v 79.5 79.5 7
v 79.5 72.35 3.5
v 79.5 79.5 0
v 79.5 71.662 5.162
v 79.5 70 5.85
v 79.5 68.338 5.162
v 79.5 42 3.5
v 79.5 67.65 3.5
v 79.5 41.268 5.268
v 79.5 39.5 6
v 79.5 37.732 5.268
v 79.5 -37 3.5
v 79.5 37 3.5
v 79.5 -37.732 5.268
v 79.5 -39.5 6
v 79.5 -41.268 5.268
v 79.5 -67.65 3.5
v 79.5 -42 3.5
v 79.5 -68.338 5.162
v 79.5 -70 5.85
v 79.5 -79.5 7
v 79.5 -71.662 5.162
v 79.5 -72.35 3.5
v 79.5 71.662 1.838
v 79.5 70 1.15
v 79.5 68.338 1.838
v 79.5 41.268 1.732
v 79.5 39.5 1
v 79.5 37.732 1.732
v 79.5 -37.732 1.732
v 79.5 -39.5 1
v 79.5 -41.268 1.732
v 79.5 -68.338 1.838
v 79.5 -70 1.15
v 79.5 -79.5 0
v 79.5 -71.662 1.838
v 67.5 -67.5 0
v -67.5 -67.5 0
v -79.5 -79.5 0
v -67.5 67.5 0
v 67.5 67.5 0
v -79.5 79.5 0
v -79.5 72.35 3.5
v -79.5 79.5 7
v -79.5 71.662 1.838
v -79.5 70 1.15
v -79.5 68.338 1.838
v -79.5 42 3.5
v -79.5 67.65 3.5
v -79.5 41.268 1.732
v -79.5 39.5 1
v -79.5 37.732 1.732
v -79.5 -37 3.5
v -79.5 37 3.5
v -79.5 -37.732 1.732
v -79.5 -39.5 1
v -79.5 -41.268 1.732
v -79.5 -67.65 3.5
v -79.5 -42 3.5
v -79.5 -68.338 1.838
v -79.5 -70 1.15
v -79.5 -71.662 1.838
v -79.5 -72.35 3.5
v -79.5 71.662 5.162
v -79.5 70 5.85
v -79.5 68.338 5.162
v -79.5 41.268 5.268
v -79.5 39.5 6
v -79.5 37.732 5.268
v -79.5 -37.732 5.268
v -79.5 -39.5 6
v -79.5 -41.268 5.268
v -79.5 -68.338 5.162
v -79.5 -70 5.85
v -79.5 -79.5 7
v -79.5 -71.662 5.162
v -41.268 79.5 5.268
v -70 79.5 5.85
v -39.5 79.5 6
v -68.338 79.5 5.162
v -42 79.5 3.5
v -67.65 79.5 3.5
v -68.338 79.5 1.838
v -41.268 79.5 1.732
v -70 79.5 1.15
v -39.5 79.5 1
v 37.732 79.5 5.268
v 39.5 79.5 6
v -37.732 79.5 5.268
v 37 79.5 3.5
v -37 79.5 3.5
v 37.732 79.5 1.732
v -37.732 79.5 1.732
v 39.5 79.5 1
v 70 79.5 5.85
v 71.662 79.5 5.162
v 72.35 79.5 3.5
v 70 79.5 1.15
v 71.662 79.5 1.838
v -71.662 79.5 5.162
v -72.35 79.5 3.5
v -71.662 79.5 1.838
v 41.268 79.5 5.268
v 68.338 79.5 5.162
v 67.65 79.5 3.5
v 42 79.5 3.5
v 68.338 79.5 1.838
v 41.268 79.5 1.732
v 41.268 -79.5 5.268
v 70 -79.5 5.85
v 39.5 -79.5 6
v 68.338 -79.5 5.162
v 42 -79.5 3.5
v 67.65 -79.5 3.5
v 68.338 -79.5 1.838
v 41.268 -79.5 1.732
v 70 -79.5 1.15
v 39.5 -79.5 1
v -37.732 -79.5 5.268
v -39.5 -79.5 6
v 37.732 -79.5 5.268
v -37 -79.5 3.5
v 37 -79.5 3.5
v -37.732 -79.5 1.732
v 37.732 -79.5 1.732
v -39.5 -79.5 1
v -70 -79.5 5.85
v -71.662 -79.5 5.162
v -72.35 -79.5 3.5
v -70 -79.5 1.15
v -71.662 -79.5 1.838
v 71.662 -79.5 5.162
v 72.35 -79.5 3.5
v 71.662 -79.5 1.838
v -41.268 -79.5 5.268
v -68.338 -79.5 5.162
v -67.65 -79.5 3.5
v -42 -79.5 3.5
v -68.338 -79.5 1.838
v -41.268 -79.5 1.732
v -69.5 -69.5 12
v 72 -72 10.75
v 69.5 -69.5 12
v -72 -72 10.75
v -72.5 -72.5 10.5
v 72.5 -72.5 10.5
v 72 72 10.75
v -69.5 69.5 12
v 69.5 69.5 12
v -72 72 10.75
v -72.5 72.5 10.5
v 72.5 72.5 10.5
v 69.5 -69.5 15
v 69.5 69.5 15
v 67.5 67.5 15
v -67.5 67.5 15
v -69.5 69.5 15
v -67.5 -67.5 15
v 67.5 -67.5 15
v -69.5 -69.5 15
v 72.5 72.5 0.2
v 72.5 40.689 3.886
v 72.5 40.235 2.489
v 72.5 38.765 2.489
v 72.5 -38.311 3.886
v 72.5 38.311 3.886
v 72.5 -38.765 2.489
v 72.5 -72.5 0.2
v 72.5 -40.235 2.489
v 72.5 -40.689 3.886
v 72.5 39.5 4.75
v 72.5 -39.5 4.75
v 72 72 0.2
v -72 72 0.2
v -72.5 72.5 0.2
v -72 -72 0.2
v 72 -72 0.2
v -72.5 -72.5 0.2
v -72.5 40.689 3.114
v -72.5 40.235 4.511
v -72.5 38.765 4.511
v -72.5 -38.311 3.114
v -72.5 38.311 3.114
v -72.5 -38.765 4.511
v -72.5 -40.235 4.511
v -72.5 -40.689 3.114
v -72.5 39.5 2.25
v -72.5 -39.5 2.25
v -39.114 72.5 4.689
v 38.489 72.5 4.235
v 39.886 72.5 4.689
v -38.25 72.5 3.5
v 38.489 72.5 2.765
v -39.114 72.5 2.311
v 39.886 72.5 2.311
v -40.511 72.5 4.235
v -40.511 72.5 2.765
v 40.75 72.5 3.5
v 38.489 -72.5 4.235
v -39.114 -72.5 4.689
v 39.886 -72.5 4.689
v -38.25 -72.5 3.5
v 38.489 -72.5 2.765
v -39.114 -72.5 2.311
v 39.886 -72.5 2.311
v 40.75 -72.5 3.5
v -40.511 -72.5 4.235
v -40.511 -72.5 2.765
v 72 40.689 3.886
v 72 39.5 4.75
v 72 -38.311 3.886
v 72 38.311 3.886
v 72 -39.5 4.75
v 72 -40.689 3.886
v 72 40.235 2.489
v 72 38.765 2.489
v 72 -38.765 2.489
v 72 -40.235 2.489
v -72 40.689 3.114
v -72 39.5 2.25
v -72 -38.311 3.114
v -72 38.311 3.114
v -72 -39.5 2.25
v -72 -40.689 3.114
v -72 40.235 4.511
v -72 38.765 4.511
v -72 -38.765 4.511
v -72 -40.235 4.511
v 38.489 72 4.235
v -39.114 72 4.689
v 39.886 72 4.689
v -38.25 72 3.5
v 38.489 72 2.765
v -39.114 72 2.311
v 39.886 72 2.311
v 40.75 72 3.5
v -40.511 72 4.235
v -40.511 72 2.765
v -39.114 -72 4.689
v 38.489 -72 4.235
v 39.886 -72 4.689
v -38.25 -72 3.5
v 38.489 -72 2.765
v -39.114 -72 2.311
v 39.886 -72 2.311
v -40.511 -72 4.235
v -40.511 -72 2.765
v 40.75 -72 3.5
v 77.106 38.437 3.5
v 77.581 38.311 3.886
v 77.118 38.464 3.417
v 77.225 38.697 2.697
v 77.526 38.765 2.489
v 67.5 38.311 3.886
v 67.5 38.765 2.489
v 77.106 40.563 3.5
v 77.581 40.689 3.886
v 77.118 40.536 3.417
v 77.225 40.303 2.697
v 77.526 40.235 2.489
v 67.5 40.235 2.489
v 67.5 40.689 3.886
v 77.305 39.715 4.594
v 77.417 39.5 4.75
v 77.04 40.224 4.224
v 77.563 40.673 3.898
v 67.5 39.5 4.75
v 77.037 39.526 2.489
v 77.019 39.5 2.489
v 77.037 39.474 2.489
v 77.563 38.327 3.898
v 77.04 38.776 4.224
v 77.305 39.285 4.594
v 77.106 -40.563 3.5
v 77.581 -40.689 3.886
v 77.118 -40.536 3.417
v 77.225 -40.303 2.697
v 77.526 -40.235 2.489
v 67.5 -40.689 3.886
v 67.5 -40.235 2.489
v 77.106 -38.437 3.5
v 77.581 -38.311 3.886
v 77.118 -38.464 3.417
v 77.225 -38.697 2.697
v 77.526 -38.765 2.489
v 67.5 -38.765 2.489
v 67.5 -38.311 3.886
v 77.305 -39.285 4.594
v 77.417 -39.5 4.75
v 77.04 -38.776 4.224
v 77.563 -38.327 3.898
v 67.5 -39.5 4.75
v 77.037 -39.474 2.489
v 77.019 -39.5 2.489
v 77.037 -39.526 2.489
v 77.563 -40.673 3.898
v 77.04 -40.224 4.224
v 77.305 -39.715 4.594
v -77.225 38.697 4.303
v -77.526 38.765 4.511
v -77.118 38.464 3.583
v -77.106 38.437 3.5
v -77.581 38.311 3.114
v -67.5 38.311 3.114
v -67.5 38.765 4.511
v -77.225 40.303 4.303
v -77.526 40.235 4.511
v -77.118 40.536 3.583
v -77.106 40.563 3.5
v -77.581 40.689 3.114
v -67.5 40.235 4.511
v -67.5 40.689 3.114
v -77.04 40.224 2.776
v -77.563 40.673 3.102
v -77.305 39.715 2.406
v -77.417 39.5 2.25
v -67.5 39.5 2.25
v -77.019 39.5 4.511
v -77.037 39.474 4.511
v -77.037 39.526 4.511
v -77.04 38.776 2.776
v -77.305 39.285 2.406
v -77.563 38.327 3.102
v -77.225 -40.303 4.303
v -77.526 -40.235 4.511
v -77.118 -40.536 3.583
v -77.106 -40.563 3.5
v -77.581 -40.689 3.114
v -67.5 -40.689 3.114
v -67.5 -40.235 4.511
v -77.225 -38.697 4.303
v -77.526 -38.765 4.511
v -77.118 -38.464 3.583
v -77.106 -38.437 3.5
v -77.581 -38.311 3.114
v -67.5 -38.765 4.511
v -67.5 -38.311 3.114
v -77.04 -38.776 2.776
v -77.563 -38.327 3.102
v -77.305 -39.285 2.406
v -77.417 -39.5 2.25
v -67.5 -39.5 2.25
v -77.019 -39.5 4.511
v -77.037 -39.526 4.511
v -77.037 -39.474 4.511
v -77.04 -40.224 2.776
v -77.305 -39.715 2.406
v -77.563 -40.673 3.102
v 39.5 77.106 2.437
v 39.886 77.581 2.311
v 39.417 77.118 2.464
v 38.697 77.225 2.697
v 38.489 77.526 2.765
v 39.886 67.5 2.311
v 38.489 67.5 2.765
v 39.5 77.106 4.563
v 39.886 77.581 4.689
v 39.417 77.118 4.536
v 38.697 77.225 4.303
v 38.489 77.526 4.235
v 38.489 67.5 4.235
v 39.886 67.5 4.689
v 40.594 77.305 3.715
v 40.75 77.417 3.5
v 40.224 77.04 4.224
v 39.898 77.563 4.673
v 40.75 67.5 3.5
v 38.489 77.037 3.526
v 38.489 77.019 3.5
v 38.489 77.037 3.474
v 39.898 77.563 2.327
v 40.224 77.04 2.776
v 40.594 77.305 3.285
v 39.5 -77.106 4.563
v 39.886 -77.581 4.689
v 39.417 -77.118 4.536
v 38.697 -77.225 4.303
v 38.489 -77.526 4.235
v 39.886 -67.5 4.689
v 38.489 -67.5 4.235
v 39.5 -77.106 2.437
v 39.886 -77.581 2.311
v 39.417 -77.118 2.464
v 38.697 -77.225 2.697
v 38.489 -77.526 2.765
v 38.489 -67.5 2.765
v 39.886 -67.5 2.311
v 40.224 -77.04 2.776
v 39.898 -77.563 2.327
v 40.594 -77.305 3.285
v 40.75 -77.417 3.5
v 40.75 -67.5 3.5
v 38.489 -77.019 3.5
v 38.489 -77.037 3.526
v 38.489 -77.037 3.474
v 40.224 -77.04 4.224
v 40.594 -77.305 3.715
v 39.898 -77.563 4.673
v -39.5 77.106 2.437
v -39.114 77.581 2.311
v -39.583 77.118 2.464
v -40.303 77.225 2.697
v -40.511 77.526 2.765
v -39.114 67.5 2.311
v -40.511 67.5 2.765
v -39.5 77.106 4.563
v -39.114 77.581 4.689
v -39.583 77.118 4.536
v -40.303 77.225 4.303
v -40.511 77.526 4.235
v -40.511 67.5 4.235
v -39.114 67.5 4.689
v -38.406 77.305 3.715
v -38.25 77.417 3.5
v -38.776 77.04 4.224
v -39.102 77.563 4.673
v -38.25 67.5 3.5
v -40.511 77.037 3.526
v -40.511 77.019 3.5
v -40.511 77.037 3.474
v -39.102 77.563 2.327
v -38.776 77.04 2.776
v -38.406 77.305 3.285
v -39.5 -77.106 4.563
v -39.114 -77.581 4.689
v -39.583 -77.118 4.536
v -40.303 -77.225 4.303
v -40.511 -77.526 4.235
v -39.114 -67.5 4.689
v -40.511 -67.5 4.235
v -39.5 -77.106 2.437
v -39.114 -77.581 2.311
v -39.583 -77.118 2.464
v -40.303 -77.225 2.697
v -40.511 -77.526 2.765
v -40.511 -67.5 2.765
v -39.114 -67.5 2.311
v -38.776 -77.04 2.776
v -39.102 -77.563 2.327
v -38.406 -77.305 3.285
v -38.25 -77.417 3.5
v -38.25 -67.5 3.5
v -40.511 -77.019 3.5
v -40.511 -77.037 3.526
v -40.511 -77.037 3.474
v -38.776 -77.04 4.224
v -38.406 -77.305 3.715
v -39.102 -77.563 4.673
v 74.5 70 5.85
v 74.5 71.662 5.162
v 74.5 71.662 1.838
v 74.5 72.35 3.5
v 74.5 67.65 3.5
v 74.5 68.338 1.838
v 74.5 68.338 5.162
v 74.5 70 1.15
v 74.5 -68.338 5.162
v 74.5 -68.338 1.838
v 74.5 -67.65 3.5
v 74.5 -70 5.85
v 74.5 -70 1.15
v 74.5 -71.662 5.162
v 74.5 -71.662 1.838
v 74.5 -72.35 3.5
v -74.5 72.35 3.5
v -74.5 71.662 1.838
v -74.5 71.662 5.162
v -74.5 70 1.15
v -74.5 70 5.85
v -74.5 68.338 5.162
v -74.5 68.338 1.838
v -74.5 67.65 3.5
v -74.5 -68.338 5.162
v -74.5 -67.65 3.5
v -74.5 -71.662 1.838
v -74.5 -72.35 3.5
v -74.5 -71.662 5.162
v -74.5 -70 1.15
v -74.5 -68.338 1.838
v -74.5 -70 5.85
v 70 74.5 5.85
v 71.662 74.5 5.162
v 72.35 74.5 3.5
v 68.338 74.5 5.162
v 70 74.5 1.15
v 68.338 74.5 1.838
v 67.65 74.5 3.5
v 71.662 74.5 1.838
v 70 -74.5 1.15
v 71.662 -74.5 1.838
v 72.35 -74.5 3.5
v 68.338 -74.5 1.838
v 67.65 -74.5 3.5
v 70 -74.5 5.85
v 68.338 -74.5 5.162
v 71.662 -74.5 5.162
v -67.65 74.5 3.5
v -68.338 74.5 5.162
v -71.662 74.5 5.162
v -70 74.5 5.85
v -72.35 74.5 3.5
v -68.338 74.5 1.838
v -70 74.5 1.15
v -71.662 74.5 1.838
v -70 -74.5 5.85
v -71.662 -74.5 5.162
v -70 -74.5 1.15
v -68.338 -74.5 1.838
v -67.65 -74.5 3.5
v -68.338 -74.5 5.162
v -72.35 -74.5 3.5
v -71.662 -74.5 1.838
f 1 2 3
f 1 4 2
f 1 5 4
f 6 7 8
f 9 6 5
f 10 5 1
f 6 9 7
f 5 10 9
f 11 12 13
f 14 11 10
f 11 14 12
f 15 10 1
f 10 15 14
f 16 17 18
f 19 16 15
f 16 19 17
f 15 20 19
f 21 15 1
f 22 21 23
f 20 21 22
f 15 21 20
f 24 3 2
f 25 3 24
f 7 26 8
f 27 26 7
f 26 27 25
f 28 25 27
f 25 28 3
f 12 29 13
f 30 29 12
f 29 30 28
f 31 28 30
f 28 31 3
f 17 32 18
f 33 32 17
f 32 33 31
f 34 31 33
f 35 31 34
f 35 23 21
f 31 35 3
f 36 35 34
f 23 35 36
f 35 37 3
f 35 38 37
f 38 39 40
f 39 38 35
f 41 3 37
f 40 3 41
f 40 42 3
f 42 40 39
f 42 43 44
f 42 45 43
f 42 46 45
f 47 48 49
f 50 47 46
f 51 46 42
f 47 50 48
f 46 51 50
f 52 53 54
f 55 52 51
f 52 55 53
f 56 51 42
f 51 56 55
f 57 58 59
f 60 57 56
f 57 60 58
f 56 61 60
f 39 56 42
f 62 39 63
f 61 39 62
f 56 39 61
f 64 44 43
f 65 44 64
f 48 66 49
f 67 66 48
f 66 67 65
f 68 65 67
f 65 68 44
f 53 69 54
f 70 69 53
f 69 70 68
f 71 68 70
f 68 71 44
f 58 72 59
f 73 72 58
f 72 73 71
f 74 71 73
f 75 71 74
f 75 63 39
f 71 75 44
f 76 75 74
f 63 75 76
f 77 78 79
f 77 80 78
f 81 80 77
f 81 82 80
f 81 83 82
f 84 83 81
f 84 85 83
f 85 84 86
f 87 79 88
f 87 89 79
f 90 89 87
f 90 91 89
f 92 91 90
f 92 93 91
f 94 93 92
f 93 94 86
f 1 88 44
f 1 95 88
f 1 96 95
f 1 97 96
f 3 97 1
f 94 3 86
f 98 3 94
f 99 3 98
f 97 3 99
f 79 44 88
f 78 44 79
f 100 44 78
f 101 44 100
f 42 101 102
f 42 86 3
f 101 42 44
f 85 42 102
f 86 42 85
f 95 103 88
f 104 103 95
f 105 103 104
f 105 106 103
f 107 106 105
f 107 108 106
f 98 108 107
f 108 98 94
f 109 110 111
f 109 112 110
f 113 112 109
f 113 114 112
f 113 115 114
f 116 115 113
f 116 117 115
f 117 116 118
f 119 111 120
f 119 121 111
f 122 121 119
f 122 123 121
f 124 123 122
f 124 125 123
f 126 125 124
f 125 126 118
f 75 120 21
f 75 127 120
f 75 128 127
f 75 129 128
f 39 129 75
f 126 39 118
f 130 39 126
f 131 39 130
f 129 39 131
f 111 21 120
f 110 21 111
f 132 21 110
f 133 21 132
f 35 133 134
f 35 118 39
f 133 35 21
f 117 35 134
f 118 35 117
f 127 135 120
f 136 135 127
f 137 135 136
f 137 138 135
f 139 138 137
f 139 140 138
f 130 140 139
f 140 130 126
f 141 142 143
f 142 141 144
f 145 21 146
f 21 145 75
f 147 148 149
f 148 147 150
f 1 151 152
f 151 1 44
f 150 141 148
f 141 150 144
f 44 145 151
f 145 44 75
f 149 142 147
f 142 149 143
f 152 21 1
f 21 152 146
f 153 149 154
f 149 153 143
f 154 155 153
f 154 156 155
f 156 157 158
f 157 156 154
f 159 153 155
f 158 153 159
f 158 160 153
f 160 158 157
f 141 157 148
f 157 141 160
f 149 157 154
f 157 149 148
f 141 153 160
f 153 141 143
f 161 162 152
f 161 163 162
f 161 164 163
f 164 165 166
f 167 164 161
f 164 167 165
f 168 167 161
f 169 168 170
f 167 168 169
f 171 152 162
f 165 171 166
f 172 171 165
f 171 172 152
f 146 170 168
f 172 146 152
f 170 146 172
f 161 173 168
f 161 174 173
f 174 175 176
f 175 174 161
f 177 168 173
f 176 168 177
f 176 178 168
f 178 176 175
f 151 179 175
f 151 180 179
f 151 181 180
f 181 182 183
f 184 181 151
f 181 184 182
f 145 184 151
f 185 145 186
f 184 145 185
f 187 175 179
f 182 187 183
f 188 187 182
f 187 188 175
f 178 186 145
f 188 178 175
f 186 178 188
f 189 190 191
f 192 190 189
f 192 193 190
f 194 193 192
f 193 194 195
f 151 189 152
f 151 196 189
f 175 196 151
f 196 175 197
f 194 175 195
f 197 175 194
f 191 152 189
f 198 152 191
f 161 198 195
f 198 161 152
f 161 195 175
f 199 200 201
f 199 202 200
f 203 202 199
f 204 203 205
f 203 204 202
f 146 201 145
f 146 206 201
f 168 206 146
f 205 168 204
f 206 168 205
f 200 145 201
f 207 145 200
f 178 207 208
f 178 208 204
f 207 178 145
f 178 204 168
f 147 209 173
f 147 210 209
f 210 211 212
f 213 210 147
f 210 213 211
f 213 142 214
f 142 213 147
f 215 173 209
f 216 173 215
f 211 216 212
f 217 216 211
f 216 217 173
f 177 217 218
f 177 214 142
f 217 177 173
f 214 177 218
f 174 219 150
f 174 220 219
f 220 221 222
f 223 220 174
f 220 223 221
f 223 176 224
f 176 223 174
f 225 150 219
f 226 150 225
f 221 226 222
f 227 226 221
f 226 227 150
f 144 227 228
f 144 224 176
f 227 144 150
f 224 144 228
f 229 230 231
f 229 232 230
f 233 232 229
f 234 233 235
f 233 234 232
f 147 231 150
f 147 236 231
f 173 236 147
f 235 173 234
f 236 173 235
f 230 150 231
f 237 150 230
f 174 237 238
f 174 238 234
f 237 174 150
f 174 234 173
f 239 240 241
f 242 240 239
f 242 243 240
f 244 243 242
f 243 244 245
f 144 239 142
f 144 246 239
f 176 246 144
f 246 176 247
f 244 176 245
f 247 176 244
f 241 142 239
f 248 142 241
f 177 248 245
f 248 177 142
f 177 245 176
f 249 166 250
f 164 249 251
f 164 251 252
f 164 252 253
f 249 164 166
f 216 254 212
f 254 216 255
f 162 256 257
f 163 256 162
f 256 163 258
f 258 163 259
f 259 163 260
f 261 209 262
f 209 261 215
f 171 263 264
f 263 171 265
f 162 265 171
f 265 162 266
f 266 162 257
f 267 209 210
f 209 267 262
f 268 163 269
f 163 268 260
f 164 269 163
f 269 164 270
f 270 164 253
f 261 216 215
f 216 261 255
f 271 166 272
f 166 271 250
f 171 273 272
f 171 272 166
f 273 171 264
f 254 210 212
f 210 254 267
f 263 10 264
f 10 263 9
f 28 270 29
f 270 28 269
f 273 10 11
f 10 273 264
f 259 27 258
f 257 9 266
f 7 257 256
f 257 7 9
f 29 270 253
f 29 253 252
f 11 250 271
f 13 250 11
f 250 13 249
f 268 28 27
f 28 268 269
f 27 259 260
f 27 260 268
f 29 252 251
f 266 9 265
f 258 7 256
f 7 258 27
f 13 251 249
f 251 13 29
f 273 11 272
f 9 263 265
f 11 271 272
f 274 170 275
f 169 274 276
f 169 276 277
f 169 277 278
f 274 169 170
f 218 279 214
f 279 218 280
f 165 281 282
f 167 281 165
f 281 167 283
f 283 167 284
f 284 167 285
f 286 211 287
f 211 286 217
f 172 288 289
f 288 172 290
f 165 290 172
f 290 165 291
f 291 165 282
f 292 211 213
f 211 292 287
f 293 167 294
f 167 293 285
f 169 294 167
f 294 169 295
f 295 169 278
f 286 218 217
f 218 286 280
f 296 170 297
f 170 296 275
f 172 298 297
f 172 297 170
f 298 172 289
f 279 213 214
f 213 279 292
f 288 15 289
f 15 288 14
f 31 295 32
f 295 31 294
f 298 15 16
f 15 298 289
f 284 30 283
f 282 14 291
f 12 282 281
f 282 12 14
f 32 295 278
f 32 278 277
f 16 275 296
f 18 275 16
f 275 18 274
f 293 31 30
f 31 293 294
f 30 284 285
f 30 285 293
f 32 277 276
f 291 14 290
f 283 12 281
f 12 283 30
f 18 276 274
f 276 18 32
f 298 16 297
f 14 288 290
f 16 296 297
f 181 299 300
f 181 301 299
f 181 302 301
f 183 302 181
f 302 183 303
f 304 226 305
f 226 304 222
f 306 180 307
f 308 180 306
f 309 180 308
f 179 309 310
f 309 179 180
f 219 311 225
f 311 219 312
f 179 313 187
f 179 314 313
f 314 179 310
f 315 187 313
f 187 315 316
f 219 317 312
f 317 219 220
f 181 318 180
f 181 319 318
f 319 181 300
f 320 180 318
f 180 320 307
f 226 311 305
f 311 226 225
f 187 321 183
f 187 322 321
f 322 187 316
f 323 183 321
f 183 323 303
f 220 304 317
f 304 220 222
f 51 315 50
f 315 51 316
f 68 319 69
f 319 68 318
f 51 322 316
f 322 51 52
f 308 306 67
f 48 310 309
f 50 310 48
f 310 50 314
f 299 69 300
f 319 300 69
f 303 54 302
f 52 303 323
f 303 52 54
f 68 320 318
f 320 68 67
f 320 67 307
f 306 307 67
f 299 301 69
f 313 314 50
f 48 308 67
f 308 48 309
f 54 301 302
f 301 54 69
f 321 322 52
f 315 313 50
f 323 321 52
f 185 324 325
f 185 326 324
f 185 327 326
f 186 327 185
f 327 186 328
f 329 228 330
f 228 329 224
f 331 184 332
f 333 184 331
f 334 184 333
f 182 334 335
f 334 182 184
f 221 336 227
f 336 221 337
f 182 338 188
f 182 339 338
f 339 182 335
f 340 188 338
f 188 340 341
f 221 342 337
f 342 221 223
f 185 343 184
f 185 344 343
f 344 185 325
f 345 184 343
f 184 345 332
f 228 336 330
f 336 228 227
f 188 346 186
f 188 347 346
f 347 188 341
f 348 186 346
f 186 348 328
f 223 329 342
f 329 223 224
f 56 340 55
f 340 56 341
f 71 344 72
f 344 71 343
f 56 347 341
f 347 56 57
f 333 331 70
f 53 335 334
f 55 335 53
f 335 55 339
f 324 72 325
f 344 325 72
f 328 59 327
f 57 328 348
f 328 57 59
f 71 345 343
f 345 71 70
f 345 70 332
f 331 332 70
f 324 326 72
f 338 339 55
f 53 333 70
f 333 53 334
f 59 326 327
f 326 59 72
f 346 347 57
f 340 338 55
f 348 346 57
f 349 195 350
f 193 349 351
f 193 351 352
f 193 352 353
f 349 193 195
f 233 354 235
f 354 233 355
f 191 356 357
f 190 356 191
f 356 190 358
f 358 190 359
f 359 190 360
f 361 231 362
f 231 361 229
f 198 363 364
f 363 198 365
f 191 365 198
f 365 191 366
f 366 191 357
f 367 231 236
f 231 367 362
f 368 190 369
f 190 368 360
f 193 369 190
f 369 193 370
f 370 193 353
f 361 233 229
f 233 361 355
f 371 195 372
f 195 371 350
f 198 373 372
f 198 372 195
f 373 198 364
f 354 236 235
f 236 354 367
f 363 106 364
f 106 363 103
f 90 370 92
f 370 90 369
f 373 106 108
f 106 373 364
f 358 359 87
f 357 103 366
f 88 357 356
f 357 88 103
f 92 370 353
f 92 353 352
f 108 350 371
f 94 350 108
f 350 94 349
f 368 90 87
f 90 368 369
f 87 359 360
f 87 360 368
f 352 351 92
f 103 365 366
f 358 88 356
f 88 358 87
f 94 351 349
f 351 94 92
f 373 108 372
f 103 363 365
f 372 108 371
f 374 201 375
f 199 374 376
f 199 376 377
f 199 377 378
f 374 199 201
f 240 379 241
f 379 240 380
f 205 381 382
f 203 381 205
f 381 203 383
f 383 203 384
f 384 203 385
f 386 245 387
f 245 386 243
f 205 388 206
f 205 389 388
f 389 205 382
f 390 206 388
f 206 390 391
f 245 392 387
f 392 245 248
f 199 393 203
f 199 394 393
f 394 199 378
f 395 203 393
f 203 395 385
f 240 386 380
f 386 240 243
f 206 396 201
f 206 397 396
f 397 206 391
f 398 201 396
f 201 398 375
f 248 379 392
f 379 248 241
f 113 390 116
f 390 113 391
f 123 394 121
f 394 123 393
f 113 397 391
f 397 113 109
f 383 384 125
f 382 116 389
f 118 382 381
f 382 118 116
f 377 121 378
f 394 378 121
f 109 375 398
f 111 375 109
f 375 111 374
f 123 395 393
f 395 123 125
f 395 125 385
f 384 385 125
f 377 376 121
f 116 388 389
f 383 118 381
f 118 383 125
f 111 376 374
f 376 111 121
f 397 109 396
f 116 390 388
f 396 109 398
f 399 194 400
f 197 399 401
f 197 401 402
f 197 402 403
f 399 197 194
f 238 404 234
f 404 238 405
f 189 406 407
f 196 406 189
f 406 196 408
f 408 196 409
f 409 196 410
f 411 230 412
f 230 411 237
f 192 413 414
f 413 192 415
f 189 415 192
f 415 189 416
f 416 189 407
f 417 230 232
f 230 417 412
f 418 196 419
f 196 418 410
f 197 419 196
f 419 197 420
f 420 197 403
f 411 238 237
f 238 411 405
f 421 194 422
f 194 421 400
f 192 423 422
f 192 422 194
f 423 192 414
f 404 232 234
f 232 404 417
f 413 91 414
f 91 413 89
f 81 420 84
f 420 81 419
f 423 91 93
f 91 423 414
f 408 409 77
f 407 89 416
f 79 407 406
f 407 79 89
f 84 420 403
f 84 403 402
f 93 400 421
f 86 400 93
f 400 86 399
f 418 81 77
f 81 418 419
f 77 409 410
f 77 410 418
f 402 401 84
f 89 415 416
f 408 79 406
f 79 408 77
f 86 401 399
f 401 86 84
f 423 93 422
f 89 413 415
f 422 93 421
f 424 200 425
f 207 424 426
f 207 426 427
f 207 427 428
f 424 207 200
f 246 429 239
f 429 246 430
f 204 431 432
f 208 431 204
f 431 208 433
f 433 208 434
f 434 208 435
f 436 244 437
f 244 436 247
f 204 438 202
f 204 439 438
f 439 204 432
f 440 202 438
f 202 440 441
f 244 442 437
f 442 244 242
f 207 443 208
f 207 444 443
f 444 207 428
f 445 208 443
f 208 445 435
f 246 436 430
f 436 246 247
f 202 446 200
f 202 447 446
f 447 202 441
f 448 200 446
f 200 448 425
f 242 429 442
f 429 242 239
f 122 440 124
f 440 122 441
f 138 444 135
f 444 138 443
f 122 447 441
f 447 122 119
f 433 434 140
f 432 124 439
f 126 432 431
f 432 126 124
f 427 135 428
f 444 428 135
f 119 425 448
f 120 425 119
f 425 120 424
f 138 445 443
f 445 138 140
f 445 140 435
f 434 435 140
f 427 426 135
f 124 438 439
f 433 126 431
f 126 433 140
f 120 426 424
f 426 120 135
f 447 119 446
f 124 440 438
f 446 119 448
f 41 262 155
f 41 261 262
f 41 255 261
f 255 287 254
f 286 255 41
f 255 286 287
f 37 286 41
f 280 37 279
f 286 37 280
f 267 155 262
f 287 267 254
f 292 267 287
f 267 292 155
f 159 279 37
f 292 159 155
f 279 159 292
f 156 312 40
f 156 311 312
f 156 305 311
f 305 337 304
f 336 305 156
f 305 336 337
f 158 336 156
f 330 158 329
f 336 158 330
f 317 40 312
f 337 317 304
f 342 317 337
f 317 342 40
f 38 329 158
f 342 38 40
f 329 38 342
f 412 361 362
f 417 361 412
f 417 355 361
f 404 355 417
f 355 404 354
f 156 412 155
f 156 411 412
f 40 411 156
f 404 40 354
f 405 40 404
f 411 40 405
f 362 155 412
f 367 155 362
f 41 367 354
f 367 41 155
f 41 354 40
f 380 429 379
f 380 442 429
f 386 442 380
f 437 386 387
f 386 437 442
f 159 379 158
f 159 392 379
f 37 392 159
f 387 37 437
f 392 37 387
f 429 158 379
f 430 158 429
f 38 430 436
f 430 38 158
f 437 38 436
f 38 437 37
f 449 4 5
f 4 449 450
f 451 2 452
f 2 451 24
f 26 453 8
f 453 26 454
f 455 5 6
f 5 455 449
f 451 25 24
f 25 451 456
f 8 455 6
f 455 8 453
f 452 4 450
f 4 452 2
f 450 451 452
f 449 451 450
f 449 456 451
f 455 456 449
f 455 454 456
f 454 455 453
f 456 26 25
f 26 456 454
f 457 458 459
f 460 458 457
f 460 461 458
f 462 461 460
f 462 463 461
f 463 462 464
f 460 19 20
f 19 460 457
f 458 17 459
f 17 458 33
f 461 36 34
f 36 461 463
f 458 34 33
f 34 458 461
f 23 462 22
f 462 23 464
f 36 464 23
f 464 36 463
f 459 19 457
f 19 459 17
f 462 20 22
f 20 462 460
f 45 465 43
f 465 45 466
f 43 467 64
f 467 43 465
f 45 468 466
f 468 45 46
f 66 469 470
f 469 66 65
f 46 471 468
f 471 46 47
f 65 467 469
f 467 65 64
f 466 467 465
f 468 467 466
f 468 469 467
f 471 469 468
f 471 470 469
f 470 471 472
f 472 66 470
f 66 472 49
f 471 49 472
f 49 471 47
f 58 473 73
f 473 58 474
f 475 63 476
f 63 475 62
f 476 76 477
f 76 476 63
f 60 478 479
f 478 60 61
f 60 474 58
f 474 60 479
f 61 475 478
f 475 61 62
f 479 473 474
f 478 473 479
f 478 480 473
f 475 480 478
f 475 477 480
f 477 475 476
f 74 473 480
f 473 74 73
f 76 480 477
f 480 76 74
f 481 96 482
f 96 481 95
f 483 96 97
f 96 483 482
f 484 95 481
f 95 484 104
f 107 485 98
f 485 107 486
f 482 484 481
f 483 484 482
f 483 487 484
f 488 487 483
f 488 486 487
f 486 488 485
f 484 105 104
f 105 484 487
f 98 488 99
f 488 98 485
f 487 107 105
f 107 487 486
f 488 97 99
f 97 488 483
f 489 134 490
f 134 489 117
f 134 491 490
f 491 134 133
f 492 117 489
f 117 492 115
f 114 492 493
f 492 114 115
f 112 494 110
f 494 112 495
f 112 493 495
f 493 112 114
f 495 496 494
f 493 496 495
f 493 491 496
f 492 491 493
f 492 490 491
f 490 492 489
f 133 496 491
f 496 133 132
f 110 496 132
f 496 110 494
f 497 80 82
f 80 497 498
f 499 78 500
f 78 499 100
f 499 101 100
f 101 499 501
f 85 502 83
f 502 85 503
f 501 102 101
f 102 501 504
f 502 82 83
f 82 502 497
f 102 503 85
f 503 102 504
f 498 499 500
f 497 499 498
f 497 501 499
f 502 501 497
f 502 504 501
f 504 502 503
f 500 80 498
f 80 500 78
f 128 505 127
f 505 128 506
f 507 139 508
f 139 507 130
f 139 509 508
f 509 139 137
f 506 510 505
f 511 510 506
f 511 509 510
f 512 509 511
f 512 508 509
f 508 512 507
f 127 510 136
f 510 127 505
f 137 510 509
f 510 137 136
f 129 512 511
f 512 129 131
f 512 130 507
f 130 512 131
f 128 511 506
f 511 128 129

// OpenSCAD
// file: config_4x5.scad
/*
This is the base configuration file for the 4x5" format
# we are not using the exact ANSI measures, but slightly rounded measures for slight simplification
*/
vStabilizerTotal_h = 7;

// general tolerance
vTolerance = 0.2;

// sheet film and cassette measurements (roughly based on the ANSI measurements)
vFilmSheet_l = 127;
vFilmSheet_w = 102;
vCassette_l = 160; // A min
vCassette_w = 121; // B max
vCassette_h = 13.2; // C max
vLightTrap_l = 2; // M2
vLightTrap_w = vCassette_w;
vLightTrap_h = 1.5; // M1
vLightTrap_offsetX = 141; // G max
vFilmWindow_l = 121;
vFilmWindow_w = 101;
vFilmWindow_offsetX = 16;
vGroundGlass_offsetZ = 5;

// Graflok
vGraflok_h = 6; // this is not the official measurement, just measured from a camera 

// lens board measures (we are using Wista/Technika-style lensboards)
vLensboard_l = 100;
vLensboard_w = 97;
vLensboard_h = 2;
vLensboard_offsetX = -(vLensboard_l+3)/2; // caution: we have an asymetric offset!
vLensboard_offsetY = -vLensboard_w/2;
vLensboardHole_d = 85;
vLensboardLighttrap_d = 89;
vLensboardLighttrap_h = 1+vTolerance;

// bellows frame measures - the bellows frame design is derived from standardcameras.com
// back frame
vBellowsBackInner_l = 144; //???? check and replace with the measurement from your bellows!
vBellowsBackInner_w = vBellowsBackInner_l;
vBellowsBackOuter_l = vBellowsBackInner_l+1;
vBellowsBackOuter_w = vBellowsBackOuter_l;

vBellowsBackFrameOuter_l = 159;
vBellowsBackFrameOuter_w = vBellowsBackFrameOuter_l;
vBellowsBackFrameOuter_h = 7;
vBellowsBackFrameInner_l = 135;
vBellowsBackFrameInner_w = vBellowsBackFrameInner_l;
vBellowsBackFrameInner_h = 5;

vBellowsBackLightTrapOuter_l = vBellowsBackFrameInner_l+2*2;
vBellowsBackLightTrapOuter_w = vBellowsBackLightTrapOuter_l;
vBellowsBackLightTrap_h = 3;

//vBellowsBackFrameScrewHole_d = 2;
//vBellowsBackFrameScrewHole_h = 10;
vBellowsBackFrameScrewHole_offsetXY = 70;
vBellowsBackFrameScrewHole_offsetZ = vBellowsBackFrameOuter_h/2;

// front frame
vBellowsFrontInner_l = 94; //???? check and replace with the measurement from your bellows!
vBellowsFrontInner_w = vBellowsFrontInner_l;
vBellowsFrontOuter_l = vBellowsFrontInner_l+1;
vBellowsFrontOuter_w = vBellowsFrontOuter_l;

vBellowsFrontFrameOuter_l = 104;
vBellowsFrontFrameOuter_w = vBellowsFrontFrameOuter_l;
vBellowsFrontFrameOuter_h = 7;
vBellowsFrontFrameInner_l = 82;
vBellowsFrontFrameInner_w = vBellowsFrontFrameInner_l;
vBellowsFrontFrameInner_h = 5;

vBellowsFrontLightTrapOuter_l = vBellowsFrontFrameInner_l+2*2;
vBellowsFrontLightTrapOuter_w = vBellowsFrontLightTrapOuter_l;
vBellowsFrontLightTrap_h = 0;

//vBellowsFrontFrameScrewHole_d = 2;
//vBellowsFrontFrameScrewHole_h = 10;
vBellowsFrontFrameScrewHole_offsetXY = 40;
vBellowsFrontFrameScrewHole_offsetZ = vBellowsFrontFrameOuter_h/2;

// body dimensions
vWall_strength = 5;
vBodyOuter_l = 185; // make sure this is at least 4*vWall_strength larger than vBellowsBackFrameOuter_l!
vBodyOuter_w = 170; // make sure this is at least 2*vWall_strength larger than vBellowsBackFrameOuter_l!
vBodyOuter_h = 65;
vBodyEdge_r = vWall_strength;

// we will center our model on the Y axis and on the center of the bellows frame
// at least for the 4x5 version, we have to do an asymetric offset of 2.5mm on the X-axis 
vAsymOffsetX = -2.5;  

// back plate
vBackPlateLength = 160; // we will probably use about the same size as the bellows back frame
vBackPlateStrength = vWall_strength;

// hinges for front lid
vHingeInnerDistance = 100;
vHingeBaseWidth = 20;
vHingeHole = 5;

// lid lock measures
vLidLockBase_d = 8;
vLidLockHole_distance = 70;

// rail dimensions
vLowerRail_w = 90;
vUpperRail_w = vLowerRail_w;

// cutout for stop indents
vStopIndent_l = 4;
vStopIndent_h = 5;
vStopIndentDistance = 25; // shorter than 25 is not necessary
vStopIndent_offsetX = 20; // don't go shorter than 20 if you intend to use a 90mm lens!

// for all dovetails we use a base width of 5mm and a base height of 5mm
// we are applying tolerances to the inner AND outer part of a dovetail, in width and height
vDoveTail_w = 5;
vDoveTail_h = 5;
vDoveTail_tolerance = 0.2;

// front standard carrier / slider
// width is depending on vUpperRail_w
vSliderBase_w = vUpperRail_w + (4*vDoveTail_w);
vSliderBase_l = 40; // make sure to have enough space in the body.


// lever plate 
vLeverPlateBase_w = vUpperRail_w - (8*vDoveTail_w);
vLeverPlateBlock_w = 25;
vLeverPlateBlock_l = vSliderBase_l-(2*vDoveTail_w);

vFrontStandard_h = 130;
vFrontStandardSlot_h = vFrontStandard_h - 30;

// lensboard carrier
vFrontPlate_length = vSliderBase_w+6; // vSliderBase_w is a bit too tight for 4x5", so there we will add 5mm, for 5x7 vSliderBase_w is OK to get a squared lensboard carrier
vFrontPlate_width = vSliderBase_w; //vFrontPlate_length;
vFrontPlate_height = 16;
vEdgeCutCylinder = floor(sqrt(2*pow(vFrontPlate_width,2)))-5;

vTiltDovetailBase_d1 = 30;
vTiltDovetailBase_d2 = vTiltDovetailBase_d1+(2*vDoveTail_w);
vTiltDovetailBaseBlock_d = vTiltDovetailBase_d1+(4*vDoveTail_w);

vTiltDovetail_d1 = vTiltDovetailBase_d1-vTolerance;
vTiltDovetail_d2 = vTiltDovetailBase_d2-vTolerance;
vTiltDovetail_h = vDoveTail_w-vTolerance;

vTiltDovetailCutout_d1 = vTiltDovetailBase_d2+vTolerance;
vTiltDovetailCutout_d2 = vTiltDovetailBase_d1+vTolerance;

vAxisHole_d = 10+vTolerance;
vAxisHole_h = vDoveTail_w+vTolerance;

vTiltLockBolt_d = 12;
vTiltLockBolt_h = 14;
vTiltLockBoltHole_d = 8;
vTiltLockBoltHole_h = vTiltLockBolt_h;

vTiltHeight = 50;
vTiltRadius = vFrontPlate_length/2;
vTiltAngleMinus = -7;
vTiltAnglePlus = 7;
vTiltAxis_d = 10-vTolerance;

// focusing rod
vFocusingRod_d = 6;
vFocusingKnob_d = 25;
vFocusingKnob_h = 20;

// stabilizer measures (just the outer measures of our stabilizer block, not the tripod slider)
vStabilizerBase_l = 135;
vStabilizerBase_w = 90;  
vStabilizerBase_h = 7;
vStabilizerDovetailBase_w = 50;
// screw holes for the stabilizer
vLidHoleCount_x = 4;
vLidHoleDist_x = 35;
vLidHoleCount_y = 2;
vLidHoleDist_y = 60;


// screw diameters, length is individually set
vScrew1Hole_d = 3;
vScrew1ThreadHole_d = 2.2;
vScrew2Hole_d = 2;
vScrew2ThreadHole_d = 1.4;


// Dimensions for small heat set insert holes.
// Sized for M2 inserts, 4 mm depth, 3.5 mm max OD
// (may be labelled M2x3.5x4)
vInsertM2Hole_d = 3.2;
vInsertM2MinDepth_h = 5.0;
vInsertM2Size_d = 3.5;
vInsertM2Depth_h = 4.0;

// Dimensions for heat set insert holes.
// Sized for "Voron standard" M3 inserts, 4 mm depth, 5 mm max OD
// (variously labelled M3x4x5 or M3x5x4)
vInsertM3Hole_d = 4.7;
vInsertM3MinDepth_h = 5.0;
vInsertM3Size_d = 5.0;
vInsertM3Depth_h = 4.0;

// Dimensions for large heat set insert holes.
// Sized for M5 inserts, 5 mm depth, 7 mm max OD
// (may be labelled M5x7x5)
vInsertM5Hole_d = 6.7;
vInsertM5MinDepth_h = 6.0;
vInsertM5Size_d = 7.0;
vInsertM5Depth_h = 5.0;
// file: modules.scad
/*
This is a collection of the modules which are used heavily within the whole project.
Almost all parts rely on the modules to remain "as is", especially regarding their current orientation.
So please act very carefully here, otherwise you may screw up the complete design!

*/
include <baseconfig.scad>;


// roof module - this is heavily used for dovetail cutouts
// please keep as is
module roof(l, w, h){
    polyhedron(
        points=[
            [0,0,0],
            [l,0,0],
            [l,w,0],
            [0,w,0],
            [0,w/2,h],
            [l,w/2,h]
            ],
        faces=[
            [0,1,2,3],
            [0,4,1],
            [1,4,5,2],
            [2,5,3],
            [3,5,4,0]
            ]
            );
    };

// a wedge module - this is heavily used for cutting edges
// please keep as is    
module wedge(l, w, h) {
    polyhedron(
            points=[
                [0,0,0],
                [l,0,0],
                [l,w,0],
                [0,w,0],
                [0,0,h],
                [l,0,h]
            ],
            faces=[
                [0,3,2,1],
                [0,1,5,4],
                [1,2,5],
                [2,3,4,5],
                [3,0,4]
            ]
    );
   };

// simple tube module.   
module tube(d1, d2, h) {
    difference() {
        cylinder(d=d1, h=h);
        cylinder(d=d2, h=h);
        };
    };

// mainly used for making holes for countersunk screws
// please keep as is    
module countersunk_screw(vScrew_d, vScrew_l){
    union(){
    cylinder(d=vScrew_d, h=vScrew_l);
    cylinder(d1=vScrew_d*2, h=vScrew_d);
    };
};

// module for making hexagons, e.g. hex nuts. kw is the key width
// please keep as is
module hex(kw, h) {
	render()
        translate([0, 0, h/2])
            intersection_for(a = [0, 120, 240]) {
                rotate([0, 0, a])
                    cube([kw, 3 * kw, h], true);
                }
}


// Heatset insert
// d: Thread diameter
// od: Outer diameter
// l: Total length
module insert(d, od, l)
{
    difference() {
        cylinder(l, d=od, $fn=15);
        translate([0, 0, -0.5]) cylinder(l+1, d=d, $fn=15);
        };
}

module insert_m2()
{
    color("gold") insert(2, vInsertM2Size_d, vInsertM2Depth_h);
}

module insert_m3()
{
    color("gold") insert(3, vInsertM3Size_d, vInsertM3Depth_h);
}

module insert_m5()
{
    color("gold") insert(5, vInsertM5Size_d, vInsertM5Depth_h);
}

// Countersunk screw, metric, for display
// Example: https://www.aliexpress.com/item/1005007838338973.html
module screw_cs(l, d=3, dk=6, s=2, t=1) {
    // l: total length (including head) in mm
    // d: thread diameter (eg 3 for M3)
    // dk: max head diameter
    // s: hex socket flat-to-flat size
    // t: hex socket depth
    difference() {
        union() {
            cylinder(h=l, r=d/2, $fn=15);
            cylinder(h=(dk-d)/2, r1=dk/2, r2=d/2, $fn=15);
            }
        cylinder(h=t, r=s/2*2/sqrt(3), $fn=6);
    }
}

module screw_m3_cs(l) {
    color("silver") screw_cs(l, d=3, dk=6, s=2, t=1);
}

// Button head screw, metric, for display
// Example: https://www.aliexpress.com/item/32967225441.html
module screw_bh(l, d=3, k=1.5, dk=5.5, s=2, t=1) {
    // l: shaft length (NOT including head) in mm
    // d: thread diameter (eg 3 for M3)
    // k: head depth
    // dk: head max diameter
    // s: hex socket flat-to-flat size
    // t: hex socket depth
    difference() {
        union() {
            translate([0, 0, k]) cylinder(h=l, r=d/2, $fn=15);
            difference() {
                translate([0, 0, k]) intersection() {
                    sphere(d=dk, $fn=15);
                    translate([-dk/2, -dk/2, -dk]) cube(dk);
                }
                translate([-dk/2, -dk/2, -dk]) cube(dk);
            }
        }
        cylinder(h=t, r=s/2*2/sqrt(3), $fn=6);
    }
}

module screw_m2_bh(l) {
    color("silver") screw_bh(l, d=2, dk=3.4, s=1.175, t=0.6);
}
// file: baseconfig.scad
/*
Here we define some variables which are independent from the camera format
*/


// some generic variables

// we are including a format specific configuration sheet - but make sure to include only one!

include <config_4x5.scad>;
// include <config_5x7.scad>;
// include <config_8x10.scad>;

// Arca Swiss tripod plate
// caution: some Arca Swiss compatible tripod heads may have slight variations
// vArca_length = xx; // the length is irrelevant here
vArca_width = 38;
vArca_height = 7;
vArcaBase_cutout = 4;
vArcaBase_height = 1.5;
// main file
// loading the base configuration
include <baseconfig.scad>;

// some modules such as hex, countersunk screws, roof, wedge are available in a module file
use <modules.scad>;

module bellows_back_frame() {

// we are centering our cube
vLowerCube_l = vBellowsBackFrameOuter_l;
vLowerCube_w = vLowerCube_l;
vLowerCube_h = vBellowsBackFrameOuter_h;
vLowerCube_offsetX = -vLowerCube_l/2;
vLowerCube_offsetY = -vLowerCube_w/2;
vLowerCube_offsetZ = 0;

// we build our pyramid as cone with 4 segments
vMiddlePyramid_d1 = sqrt(2*pow(vBellowsBackFrameOuter_l,2));
vMiddlePyramid_d2 = sqrt(2*pow(vBellowsBackLightTrapOuter_l,2));
vMiddlePyramid_h = vBellowsBackFrameInner_h;
vMiddlePyramid_offsetX = 0;
vMiddlePyramid_offsetY = 0;
vMiddlePyramid_offsetZ = vLowerCube_h;

vUpperCube_l = vBellowsBackLightTrapOuter_l;
vUpperCube_w = vBellowsBackLightTrapOuter_w;
vUpperCube_h = vBellowsBackLightTrap_h;
vUpperCube_offsetX = -vUpperCube_l/2;
vUpperCube_offsetY = -vUpperCube_w/2;
vUpperCube_offsetZ = vLowerCube_h+vMiddlePyramid_h;

vInnerCutout_l = vBellowsBackFrameInner_l;
vInnerCutout_w = vBellowsBackFrameInner_l;
vInnerCutout_h = vLowerCube_h+vMiddlePyramid_h+vUpperCube_h;
vInnerCutout_offsetX = -vInnerCutout_l/2;
vInnerCutout_offsetY = -vInnerCutout_w/2;
vInnerCutout_offsetZ = 0;

vSplitCutoutOuter_l = vBellowsBackOuter_l;
vSplitCutoutOuter_w = vBellowsBackOuter_w;
vSplitCutoutOuter_h = vInnerCutout_h;
vSplitCutoutOuter_offsetX = -vSplitCutoutOuter_l/2;
vSplitCutoutOuter_offsetY = -vSplitCutoutOuter_w/2;
vSplitCutoutOuter_offsetZ = 0.2;

vSplitCutoutInner_l = vBellowsBackInner_l;
vSplitCutoutInner_w = vBellowsBackInner_w;
vSplitCutoutInner_h = vInnerCutout_h;
vSplitCutoutInner_offsetX = -vSplitCutoutInner_l/2;
vSplitCutoutInner_offsetY = -vSplitCutoutInner_w/2;
vSplitCutoutInner_offsetZ = 0.2;

vBellowsScrew_d = 2.5;
vBellowsScrew_h = 20;
vBellowsScrew_offsetX = (vLowerCube_l)/2;
vBellowsScrew_offsetY = (vLowerCube_l)/2-40;
vBellowsScrew_offsetZ = vLowerCube_h/2;

// screw holes for fixing the whole frame in the body
vBellowsBackFrameScrewHole_offsetX = (vLowerCube_l)/2;
vBellowsBackFrameScrewHole_offsetY = vBellowsBackFrameScrewHole_offsetXY;

vBellowsBackFrameScrewHole_d=vInsertM3Hole_d;
vBellowsBackFrameScrewHole_h=vInsertM3MinDepth_h;

difference(){
    union(){
        // lower cube
        translate([vLowerCube_offsetX, vLowerCube_offsetY, vLowerCube_offsetZ])
            cube([vLowerCube_l, vLowerCube_w, vLowerCube_h]);
        
        // middle pyramid
        translate([vMiddlePyramid_offsetX, vMiddlePyramid_offsetY, vMiddlePyramid_offsetZ])
            rotate([0, 0, 45])
                cylinder(d1=vMiddlePyramid_d1, d2=vMiddlePyramid_d2, h=vMiddlePyramid_h, $fn=4);
        
        // upper cube
        translate([vUpperCube_offsetX, vUpperCube_offsetY, vUpperCube_offsetZ])
            cube([vUpperCube_l, vUpperCube_w, vUpperCube_h]);
        
        };
    
    // split cutout
    difference(){
        // split cutout outer cube
        translate([vSplitCutoutOuter_offsetX, vSplitCutoutOuter_offsetY, vSplitCutoutOuter_offsetZ])
            cube([vSplitCutoutOuter_l, vSplitCutoutOuter_w, vSplitCutoutOuter_h]);
        
        // split cutout inner cube
        translate([vSplitCutoutInner_offsetX, vSplitCutoutInner_offsetY, vSplitCutoutInner_offsetZ])
            cube([vSplitCutoutInner_l, vSplitCutoutInner_w, vSplitCutoutInner_h]);
        }

    // inner cutout cube
        translate([vInnerCutout_offsetX, vInnerCutout_offsetY, vInnerCutout_offsetZ])
            cube([vInnerCutout_l, vInnerCutout_w, vInnerCutout_h]);
        
    // inner screw holes (countersunk screws)
    // screws in x/-x direction    
    translate([vBellowsScrew_offsetX, vBellowsScrew_offsetY, vBellowsScrew_offsetZ])
        rotate([0, -90, 0])
            countersunk_screw(vBellowsScrew_d, vBellowsScrew_h);
    translate([vBellowsScrew_offsetX, -vBellowsScrew_offsetY, vBellowsScrew_offsetZ])
        rotate([0, -90, 0])
            countersunk_screw(vBellowsScrew_d, vBellowsScrew_h);
    translate([-vBellowsScrew_offsetX, vBellowsScrew_offsetY, vBellowsScrew_offsetZ])
        rotate([0, 90, 0])
            countersunk_screw(vBellowsScrew_d, vBellowsScrew_h);
    translate([-vBellowsScrew_offsetX, -vBellowsScrew_offsetY, vBellowsScrew_offsetZ])
        rotate([0, 90, 0])
            countersunk_screw(vBellowsScrew_d, vBellowsScrew_h);
    
    // screws in y/-y direction    
    translate([vBellowsScrew_offsetY, vBellowsScrew_offsetX, vBellowsScrew_offsetZ])
        rotate([90, 0, 0])
            countersunk_screw(vBellowsScrew_d, vBellowsScrew_h);
    translate([vBellowsScrew_offsetY, -vBellowsScrew_offsetX, vBellowsScrew_offsetZ])
        rotate([-90, 0, 0])
            countersunk_screw(vBellowsScrew_d, vBellowsScrew_h);
    translate([-vBellowsScrew_offsetY, vBellowsScrew_offsetX, vBellowsScrew_offsetZ])
        rotate([90, 0, 0])
            countersunk_screw(vBellowsScrew_d, vBellowsScrew_h);
    translate([-vBellowsScrew_offsetY, -vBellowsScrew_offsetX, vBellowsScrew_offsetZ])
        rotate([-90, 0, 0])
            countersunk_screw(vBellowsScrew_d, vBellowsScrew_h);    
    
    // outer screw holes 
    // screws in x/-x direction    
    translate([vBellowsBackFrameScrewHole_offsetX, vBellowsBackFrameScrewHole_offsetY, vBellowsBackFrameScrewHole_offsetZ])
        rotate([0, -90, 0])
            cylinder(d=vBellowsBackFrameScrewHole_d, h=vBellowsBackFrameScrewHole_h);
    translate([vBellowsBackFrameScrewHole_offsetX, -vBellowsBackFrameScrewHole_offsetY, vBellowsBackFrameScrewHole_offsetZ])
        rotate([0, -90, 0])
            cylinder(d=vBellowsBackFrameScrewHole_d, h=vBellowsBackFrameScrewHole_h);
    translate([-vBellowsBackFrameScrewHole_offsetX, vBellowsBackFrameScrewHole_offsetY, vBellowsBackFrameScrewHole_offsetZ])
        rotate([0, 90, 0])
            cylinder(d=vBellowsBackFrameScrewHole_d, h=vBellowsBackFrameScrewHole_h);
    translate([-vBellowsBackFrameScrewHole_offsetX, -vBellowsBackFrameScrewHole_offsetY, vBellowsBackFrameScrewHole_offsetZ])
        rotate([0, 90, 0])
            cylinder(d=vBellowsBackFrameScrewHole_d, h=vBellowsBackFrameScrewHole_h);
    
    // screws in y/-y direction    
    translate([vBellowsBackFrameScrewHole_offsetY, vBellowsBackFrameScrewHole_offsetX, vBellowsBackFrameScrewHole_offsetZ])
        rotate([90, 0, 0])
            cylinder(d=vBellowsBackFrameScrewHole_d, h=vBellowsBackFrameScrewHole_h);
    translate([vBellowsBackFrameScrewHole_offsetY, -vBellowsBackFrameScrewHole_offsetX, vBellowsBackFrameScrewHole_offsetZ])
        rotate([-90, 0, 0])
            cylinder(d=vBellowsBackFrameScrewHole_d, h=vBellowsBackFrameScrewHole_h);
    translate([-vBellowsBackFrameScrewHole_offsetY, vBellowsBackFrameScrewHole_offsetX, vBellowsBackFrameScrewHole_offsetZ])
        rotate([90, 0, 0])
            cylinder(d=vBellowsBackFrameScrewHole_d, h=vBellowsBackFrameScrewHole_h);
    translate([-vBellowsBackFrameScrewHole_offsetY, -vBellowsBackFrameScrewHole_offsetX, vBellowsBackFrameScrewHole_offsetZ])
        rotate([-90, 0, 0])
            cylinder(d=vBellowsBackFrameScrewHole_d, h=vBellowsBackFrameScrewHole_h);        

}

};

bellows_back_frame();
